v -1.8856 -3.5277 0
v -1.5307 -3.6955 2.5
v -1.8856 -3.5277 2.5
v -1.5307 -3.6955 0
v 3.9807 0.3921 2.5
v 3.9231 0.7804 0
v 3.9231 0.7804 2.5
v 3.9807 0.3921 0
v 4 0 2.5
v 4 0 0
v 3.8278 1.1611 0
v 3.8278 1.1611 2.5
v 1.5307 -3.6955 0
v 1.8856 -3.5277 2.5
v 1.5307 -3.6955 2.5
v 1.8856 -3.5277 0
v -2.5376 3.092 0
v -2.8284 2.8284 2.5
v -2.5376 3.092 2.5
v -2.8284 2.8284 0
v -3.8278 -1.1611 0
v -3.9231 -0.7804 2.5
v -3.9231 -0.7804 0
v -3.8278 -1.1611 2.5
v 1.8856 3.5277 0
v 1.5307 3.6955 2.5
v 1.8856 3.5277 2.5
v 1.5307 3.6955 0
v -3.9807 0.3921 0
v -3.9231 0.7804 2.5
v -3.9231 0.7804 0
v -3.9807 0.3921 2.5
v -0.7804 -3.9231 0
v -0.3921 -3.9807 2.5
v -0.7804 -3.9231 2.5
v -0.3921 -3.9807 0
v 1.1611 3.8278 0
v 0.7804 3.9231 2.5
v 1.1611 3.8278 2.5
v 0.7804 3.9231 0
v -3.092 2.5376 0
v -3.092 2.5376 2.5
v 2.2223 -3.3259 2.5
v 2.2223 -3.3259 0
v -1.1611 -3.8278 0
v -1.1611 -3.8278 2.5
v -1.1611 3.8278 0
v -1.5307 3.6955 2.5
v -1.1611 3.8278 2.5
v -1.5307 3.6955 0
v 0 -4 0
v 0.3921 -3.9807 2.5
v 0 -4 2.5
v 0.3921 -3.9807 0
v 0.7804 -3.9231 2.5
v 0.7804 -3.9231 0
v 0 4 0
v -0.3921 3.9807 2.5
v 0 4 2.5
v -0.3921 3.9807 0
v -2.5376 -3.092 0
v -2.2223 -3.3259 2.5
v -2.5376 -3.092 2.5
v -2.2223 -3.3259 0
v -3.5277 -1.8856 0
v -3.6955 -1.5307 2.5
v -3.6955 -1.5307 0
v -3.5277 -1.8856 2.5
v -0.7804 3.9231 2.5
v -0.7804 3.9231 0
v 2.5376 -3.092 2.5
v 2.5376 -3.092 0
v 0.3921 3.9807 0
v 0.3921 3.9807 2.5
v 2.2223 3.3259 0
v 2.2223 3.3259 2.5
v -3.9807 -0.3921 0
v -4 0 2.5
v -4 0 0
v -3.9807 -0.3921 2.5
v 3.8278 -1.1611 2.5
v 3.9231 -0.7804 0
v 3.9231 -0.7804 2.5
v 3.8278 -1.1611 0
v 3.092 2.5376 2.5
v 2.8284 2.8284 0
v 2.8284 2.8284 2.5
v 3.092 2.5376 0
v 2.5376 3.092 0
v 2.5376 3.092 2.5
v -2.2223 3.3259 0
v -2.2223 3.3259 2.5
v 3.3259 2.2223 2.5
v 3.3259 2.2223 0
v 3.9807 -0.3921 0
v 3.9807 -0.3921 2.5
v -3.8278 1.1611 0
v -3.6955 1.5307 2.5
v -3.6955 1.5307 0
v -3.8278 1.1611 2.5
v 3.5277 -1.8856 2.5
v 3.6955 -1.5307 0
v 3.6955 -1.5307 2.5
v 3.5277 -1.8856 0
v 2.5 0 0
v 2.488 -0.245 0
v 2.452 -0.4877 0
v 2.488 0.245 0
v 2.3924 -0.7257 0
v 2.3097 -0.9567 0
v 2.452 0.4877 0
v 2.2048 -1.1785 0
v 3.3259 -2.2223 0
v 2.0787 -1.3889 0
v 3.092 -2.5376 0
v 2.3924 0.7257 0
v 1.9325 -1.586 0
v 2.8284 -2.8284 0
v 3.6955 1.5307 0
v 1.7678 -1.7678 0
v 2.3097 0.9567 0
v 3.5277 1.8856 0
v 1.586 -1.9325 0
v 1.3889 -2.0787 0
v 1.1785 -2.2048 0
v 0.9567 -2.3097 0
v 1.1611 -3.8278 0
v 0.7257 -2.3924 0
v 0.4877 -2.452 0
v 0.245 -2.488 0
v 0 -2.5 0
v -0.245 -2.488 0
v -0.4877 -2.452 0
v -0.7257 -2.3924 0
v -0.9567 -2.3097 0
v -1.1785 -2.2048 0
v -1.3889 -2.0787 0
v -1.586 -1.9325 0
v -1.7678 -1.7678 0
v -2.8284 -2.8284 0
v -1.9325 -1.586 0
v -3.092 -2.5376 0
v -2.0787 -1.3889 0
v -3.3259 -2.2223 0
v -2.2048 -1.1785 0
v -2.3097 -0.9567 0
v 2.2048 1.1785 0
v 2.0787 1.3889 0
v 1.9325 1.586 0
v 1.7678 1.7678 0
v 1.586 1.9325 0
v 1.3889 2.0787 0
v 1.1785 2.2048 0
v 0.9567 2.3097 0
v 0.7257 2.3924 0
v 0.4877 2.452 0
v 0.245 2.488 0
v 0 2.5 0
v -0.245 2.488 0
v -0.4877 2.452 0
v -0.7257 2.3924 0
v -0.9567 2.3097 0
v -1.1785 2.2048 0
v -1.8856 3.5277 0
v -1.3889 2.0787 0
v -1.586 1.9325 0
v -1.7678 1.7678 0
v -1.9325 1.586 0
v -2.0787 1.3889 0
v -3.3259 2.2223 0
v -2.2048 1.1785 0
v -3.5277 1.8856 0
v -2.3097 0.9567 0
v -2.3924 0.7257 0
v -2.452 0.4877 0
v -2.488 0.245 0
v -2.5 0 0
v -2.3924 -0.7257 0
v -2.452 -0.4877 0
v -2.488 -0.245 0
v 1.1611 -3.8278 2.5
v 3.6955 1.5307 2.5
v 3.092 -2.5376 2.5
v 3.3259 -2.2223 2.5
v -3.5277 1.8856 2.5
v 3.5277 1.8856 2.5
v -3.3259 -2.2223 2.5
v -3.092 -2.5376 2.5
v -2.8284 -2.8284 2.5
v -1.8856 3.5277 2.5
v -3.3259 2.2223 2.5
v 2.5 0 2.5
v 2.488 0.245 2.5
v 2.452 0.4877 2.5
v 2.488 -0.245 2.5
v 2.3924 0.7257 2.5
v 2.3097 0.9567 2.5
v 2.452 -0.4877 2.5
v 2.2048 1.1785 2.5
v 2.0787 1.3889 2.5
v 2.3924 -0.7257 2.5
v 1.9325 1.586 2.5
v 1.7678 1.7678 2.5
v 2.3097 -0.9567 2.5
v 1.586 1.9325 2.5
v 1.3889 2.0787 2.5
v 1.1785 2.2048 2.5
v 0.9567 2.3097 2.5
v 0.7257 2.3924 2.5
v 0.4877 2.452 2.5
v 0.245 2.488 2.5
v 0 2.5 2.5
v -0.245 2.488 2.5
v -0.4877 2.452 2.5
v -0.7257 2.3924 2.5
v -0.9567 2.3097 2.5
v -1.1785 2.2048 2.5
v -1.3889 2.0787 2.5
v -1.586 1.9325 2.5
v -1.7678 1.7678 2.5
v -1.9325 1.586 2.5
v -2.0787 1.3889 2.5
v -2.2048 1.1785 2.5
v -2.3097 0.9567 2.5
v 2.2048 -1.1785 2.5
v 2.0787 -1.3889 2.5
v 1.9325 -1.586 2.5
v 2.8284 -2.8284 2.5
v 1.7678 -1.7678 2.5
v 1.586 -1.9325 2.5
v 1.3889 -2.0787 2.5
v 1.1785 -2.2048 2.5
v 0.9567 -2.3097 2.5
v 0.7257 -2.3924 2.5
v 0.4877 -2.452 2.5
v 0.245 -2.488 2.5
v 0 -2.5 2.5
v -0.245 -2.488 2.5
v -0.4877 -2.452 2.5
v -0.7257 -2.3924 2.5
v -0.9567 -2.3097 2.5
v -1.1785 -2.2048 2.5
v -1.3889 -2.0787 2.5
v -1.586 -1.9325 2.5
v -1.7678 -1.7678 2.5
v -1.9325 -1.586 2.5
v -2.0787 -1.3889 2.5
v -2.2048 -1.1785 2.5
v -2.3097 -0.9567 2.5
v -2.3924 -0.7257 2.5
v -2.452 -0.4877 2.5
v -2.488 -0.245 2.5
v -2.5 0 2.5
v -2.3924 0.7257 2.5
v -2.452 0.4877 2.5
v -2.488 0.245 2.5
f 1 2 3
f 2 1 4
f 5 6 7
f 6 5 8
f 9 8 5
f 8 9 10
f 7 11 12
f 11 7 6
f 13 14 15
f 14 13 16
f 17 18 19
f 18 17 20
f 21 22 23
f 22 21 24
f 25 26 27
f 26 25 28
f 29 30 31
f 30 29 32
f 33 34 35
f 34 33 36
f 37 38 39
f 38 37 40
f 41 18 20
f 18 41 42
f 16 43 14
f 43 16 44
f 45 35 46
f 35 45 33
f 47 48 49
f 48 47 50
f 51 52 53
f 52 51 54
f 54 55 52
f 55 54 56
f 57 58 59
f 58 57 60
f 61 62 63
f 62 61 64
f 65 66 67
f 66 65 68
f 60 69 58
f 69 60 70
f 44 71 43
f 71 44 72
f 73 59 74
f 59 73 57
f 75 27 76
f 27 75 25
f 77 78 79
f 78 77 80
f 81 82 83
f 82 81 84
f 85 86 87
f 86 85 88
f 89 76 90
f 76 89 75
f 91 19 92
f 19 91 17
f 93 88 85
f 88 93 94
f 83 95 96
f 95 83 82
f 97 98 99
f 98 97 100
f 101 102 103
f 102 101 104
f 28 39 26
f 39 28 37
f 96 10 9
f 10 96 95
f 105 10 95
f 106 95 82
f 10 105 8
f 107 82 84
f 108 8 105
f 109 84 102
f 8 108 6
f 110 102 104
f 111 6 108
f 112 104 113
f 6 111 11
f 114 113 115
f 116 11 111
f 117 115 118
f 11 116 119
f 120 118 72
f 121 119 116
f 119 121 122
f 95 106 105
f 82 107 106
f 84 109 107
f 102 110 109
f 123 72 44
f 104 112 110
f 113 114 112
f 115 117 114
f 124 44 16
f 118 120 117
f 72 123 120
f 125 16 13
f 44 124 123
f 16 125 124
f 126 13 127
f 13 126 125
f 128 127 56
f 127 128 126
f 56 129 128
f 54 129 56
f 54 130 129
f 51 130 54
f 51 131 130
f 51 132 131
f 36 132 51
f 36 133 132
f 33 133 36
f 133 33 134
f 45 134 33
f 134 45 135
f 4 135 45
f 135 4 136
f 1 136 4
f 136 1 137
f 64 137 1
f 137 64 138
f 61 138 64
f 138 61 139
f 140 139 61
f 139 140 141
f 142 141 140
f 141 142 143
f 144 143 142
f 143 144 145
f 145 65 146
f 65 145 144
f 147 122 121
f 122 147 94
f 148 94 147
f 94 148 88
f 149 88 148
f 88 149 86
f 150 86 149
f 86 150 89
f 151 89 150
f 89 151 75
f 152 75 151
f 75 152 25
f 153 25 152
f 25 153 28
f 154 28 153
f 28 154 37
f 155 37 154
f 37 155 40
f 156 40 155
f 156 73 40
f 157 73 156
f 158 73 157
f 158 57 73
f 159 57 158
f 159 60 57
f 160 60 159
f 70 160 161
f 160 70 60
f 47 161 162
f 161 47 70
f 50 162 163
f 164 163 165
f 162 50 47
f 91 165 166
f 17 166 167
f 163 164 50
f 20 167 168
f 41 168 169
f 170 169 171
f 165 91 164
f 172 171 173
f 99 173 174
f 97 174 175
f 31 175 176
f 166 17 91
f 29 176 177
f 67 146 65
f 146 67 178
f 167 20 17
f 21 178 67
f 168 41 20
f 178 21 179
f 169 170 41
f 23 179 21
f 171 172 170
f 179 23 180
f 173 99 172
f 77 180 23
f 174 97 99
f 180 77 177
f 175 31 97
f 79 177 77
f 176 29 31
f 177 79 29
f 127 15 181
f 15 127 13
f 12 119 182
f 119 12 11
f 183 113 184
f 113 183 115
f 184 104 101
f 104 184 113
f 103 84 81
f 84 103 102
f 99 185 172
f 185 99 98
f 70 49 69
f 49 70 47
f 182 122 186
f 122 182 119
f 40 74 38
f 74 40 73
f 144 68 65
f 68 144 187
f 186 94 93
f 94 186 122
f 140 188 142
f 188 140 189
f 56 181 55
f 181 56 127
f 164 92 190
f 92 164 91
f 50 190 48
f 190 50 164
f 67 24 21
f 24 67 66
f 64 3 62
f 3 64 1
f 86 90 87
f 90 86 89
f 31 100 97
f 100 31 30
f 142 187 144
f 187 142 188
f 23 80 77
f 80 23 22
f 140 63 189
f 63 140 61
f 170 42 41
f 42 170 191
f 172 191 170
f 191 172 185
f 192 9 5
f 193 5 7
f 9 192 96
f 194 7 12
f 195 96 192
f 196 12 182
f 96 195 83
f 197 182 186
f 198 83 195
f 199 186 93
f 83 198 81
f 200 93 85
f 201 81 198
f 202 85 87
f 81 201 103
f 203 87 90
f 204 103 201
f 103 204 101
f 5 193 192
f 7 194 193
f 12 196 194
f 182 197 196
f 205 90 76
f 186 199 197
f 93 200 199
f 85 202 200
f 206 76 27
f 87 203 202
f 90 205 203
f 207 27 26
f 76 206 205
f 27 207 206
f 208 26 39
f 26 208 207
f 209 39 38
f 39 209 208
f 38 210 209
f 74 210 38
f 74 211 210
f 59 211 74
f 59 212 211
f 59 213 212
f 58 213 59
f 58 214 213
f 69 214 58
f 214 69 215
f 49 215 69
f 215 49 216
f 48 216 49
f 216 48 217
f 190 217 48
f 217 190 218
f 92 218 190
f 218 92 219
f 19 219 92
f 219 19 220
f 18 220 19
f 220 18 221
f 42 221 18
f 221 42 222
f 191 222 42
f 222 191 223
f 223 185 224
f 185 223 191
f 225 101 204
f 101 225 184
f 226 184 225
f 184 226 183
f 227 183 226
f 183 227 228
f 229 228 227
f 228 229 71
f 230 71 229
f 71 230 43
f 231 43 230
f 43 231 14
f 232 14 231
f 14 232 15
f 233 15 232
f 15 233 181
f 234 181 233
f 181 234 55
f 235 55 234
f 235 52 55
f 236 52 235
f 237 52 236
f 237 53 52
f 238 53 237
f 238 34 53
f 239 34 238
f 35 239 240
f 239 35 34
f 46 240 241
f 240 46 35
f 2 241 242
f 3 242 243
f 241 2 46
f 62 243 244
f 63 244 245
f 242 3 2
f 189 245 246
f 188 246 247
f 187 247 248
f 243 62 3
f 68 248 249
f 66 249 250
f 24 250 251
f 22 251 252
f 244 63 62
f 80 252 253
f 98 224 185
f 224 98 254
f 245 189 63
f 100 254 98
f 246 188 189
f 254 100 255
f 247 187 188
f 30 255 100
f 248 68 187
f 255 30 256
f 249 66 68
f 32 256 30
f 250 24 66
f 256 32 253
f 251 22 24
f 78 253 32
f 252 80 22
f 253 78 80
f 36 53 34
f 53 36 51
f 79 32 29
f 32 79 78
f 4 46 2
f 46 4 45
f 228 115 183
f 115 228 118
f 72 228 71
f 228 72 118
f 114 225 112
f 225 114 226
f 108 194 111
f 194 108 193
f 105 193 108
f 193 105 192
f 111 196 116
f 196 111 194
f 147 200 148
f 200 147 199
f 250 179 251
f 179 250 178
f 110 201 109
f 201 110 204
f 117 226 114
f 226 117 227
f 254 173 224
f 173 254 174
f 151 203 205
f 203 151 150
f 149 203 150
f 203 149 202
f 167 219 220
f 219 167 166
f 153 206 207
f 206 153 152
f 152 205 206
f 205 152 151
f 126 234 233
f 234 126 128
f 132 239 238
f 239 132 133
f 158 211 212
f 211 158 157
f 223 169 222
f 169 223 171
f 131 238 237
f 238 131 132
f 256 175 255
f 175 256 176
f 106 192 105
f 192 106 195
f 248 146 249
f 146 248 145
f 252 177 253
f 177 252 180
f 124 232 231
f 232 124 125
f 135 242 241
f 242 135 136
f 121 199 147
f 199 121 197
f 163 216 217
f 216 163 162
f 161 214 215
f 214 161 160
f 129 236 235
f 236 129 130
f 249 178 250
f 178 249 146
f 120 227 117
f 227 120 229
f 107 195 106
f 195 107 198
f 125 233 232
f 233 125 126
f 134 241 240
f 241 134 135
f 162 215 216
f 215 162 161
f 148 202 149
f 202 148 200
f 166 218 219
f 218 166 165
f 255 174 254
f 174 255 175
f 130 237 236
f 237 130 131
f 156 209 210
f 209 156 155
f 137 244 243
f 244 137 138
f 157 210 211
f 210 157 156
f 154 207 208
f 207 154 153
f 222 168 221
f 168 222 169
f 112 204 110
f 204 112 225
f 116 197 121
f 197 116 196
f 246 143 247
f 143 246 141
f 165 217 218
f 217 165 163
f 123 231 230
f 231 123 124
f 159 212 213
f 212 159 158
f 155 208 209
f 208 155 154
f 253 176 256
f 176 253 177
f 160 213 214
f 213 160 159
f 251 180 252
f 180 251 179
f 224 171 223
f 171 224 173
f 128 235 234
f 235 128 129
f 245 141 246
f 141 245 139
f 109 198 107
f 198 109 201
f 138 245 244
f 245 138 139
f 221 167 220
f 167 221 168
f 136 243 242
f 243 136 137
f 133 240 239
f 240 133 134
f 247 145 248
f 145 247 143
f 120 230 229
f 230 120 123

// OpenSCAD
module ball_bearing() {
    difference() {
        // Outer cylinder
        cylinder(h=2.5, d=8.0, $fn=64);
        // Inner bore
        translate([0, 0, -1])
            cylinder(h=4.5, d=5.0, $fn=64);
    }
}

ball_bearing();
